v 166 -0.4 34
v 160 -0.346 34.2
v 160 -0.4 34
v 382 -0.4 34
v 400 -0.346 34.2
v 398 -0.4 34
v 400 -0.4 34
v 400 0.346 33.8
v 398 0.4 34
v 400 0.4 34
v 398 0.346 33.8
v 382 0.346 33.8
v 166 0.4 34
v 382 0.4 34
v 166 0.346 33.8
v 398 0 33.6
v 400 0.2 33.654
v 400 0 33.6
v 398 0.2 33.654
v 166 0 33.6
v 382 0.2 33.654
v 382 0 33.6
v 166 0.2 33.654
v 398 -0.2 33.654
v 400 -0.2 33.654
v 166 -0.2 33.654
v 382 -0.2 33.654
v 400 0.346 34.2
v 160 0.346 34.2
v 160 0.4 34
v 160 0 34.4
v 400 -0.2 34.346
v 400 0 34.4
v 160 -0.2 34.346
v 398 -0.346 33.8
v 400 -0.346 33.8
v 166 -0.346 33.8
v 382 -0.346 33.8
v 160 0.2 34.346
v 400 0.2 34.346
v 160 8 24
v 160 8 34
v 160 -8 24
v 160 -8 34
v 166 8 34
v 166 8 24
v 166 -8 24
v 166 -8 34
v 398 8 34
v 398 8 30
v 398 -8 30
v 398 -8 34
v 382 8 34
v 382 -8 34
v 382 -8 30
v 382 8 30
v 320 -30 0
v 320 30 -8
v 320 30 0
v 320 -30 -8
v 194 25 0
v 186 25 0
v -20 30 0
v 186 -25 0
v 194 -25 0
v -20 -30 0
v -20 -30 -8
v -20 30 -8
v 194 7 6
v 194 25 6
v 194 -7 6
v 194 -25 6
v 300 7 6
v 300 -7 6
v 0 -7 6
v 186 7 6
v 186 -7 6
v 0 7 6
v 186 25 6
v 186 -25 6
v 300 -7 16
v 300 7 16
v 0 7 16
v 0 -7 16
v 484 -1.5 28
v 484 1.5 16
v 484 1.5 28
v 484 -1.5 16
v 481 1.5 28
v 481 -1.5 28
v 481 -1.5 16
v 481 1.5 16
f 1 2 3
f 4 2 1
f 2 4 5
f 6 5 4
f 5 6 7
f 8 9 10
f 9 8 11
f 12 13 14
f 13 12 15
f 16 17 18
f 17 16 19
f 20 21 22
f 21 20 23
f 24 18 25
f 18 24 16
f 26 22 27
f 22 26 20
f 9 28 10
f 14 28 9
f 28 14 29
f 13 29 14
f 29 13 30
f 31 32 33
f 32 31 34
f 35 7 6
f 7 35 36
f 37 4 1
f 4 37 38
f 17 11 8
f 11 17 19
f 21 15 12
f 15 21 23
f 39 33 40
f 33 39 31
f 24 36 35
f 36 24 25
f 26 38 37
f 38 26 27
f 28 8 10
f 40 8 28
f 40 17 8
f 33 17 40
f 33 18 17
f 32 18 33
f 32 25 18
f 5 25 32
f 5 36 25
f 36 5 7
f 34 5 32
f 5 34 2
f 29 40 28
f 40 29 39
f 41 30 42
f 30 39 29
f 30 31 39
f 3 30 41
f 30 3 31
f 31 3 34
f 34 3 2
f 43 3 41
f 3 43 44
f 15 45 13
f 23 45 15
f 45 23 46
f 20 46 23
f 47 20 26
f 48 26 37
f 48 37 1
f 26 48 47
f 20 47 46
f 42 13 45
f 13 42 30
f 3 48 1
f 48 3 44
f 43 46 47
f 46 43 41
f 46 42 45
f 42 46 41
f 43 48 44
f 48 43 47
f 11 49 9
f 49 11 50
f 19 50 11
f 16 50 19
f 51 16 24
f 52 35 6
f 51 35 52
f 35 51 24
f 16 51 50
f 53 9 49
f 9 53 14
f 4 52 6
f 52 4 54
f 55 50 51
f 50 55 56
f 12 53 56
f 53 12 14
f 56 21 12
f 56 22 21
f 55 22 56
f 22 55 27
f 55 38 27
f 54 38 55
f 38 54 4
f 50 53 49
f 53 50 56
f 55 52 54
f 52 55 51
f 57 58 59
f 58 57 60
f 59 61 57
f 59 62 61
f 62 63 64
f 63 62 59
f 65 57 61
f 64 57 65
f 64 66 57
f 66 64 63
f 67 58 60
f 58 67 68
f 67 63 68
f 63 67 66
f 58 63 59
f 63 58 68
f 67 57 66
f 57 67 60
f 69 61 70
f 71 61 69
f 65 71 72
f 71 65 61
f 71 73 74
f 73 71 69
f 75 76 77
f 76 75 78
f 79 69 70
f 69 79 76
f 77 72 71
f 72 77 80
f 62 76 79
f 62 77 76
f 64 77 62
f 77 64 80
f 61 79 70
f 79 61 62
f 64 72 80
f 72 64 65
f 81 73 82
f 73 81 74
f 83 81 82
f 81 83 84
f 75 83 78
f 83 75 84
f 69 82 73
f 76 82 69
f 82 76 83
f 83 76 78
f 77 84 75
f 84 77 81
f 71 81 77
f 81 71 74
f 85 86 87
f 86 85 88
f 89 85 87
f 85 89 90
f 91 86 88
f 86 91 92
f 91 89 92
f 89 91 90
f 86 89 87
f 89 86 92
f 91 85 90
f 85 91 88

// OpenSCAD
// Clavichord tangent-key action coupon — ILLUSTRATIVE SCAFFOLD ONLY.
//
// Authority: pending_measurement. NOT fabrication authority. This packet is a
// V5 L2 concept study that INTENTIONALLY RELEASES NO DIMENSIONS: no scale
// length, string count, gauges, tuning, tangent coordinates, key dimensions,
// key dip, leverage, bridge/hitch layout, or case geometry (design.md,
// README "Readiness Boundary"). Every parameter below is an
// `estimate_pending_measurement` PLACEHOLDER chosen only so the mechanism reads
// as a shape — none is a design value, and none may be measured off this model
// or used to cut, drill, or lay out tangent positions.
//
// What this models: the design.md "first design job" — a single-key action
// coupon that shows how a key lever lifts a brass tangent into a string from
// below, the tangent both exciting the string and defining its speaking length
// while the key is held (the bebung / dynamic-touch mechanism). It is a
// topology diagram, not a part.
//
// Source: design.md "Mechanism Overview" / "L2 Subsystem Plan" (qualitative).
// Units: millimetres (illustrative scale only).

/* [ILLUSTRATIVE PLACEHOLDERS — NOT design values] */
// Each maps to a design.md estimate_*_pending_measurement parameter name.
est_key_length_mm        = 300;  // estimate_key_leverage_* (lever length)
est_key_width_mm         = 14;   // key blade width (illustrative)
est_key_thick_mm         = 10;
est_balance_from_front   = 190;  // estimate_key_leverage_* (pivot station)
est_key_dip_mm           = 6;    // estimate_key_dip_* (shown at rest = 0)
est_tangent_height_mm    = 12;   // estimate_tangent_face_* (brass blade)
est_tangent_width_mm     = 3;
est_string_course_mm     = 240;  // estimate_string_course_plan_* (bridge->hitch)
est_string_z_mm          = 34;   // string plane above baseboard (illustrative)
est_bridge_h_mm          = 10;   // estimate_bridge_hitchpin_field_*
est_show_pressed         = 0;    // 0 = key at rest, 1 = tangent in contact

// ---------------------------------------------------------------------------
// Illustrative geometry (topology, not dimensioned parts)
// ---------------------------------------------------------------------------

// Rotation of the key about the balance rail when a key is pressed. Derived
// from the illustrative dip only — NOT an action-geometry claim.
key_angle = est_show_pressed
  ? atan2(est_key_dip_mm, est_balance_from_front) : 0;

module baseboard() {
  color("tan")
    translate([-20, -30, -8]) cube([est_key_length_mm + 40, 60, 8]);
}

module balance_rail() {
  color("saddlebrown")
    translate([est_balance_from_front - 4, -25, 0]) cube([8, 50, 6]);
}

// Single key lever, pivoting about the balance rail. Front (player) end at x=0,
// tangent end at the rear.
module key_lever() {
  color("cornsilk")
    translate([est_balance_from_front, 0, 6])
      rotate([0, key_angle, 0])
        translate([-est_balance_from_front, -est_key_width_mm / 2, 0])
          cube([est_key_length_mm, est_key_width_mm, est_key_thick_mm]);
}

// Brass tangent standing at the rear of the key; it rises into the string when
// the key is pressed. Position follows the key rotation.
module tangent() {
  color("goldenrod")
    translate([est_balance_from_front, 0, 6])
      rotate([0, key_angle, 0])
        translate([est_key_length_mm - est_tangent_width_mm - 6,
                   -est_tangent_width_mm / 2, est_key_thick_mm])
          cube([est_tangent_width_mm, est_tangent_width_mm,
                est_tangent_height_mm]);
}

// A single string course from bridge to hitch, held at the string plane. The
// tangent contacts it partway along, splitting sounding (bridge side) from
// damped (hitch side) — the clavichord's defining feature.
module string_course() {
  x_tangent = est_key_length_mm + est_balance_from_front
              - est_balance_from_front - est_tangent_width_mm - 6
              + est_balance_from_front;  // tangent x-station (illustrative)
  color("silver")
    translate([est_balance_from_front - 30, 0, est_string_z_mm])
      rotate([0, 90, 0])
        cylinder(h = est_string_course_mm, d = 0.8, $fn = 12);
  // Bridge (bridge-side speaking boundary) and hitch (damped end).
  color("peru")
    translate([est_balance_from_front - 30, -8, est_string_z_mm - est_bridge_h_mm])
      cube([6, 16, est_bridge_h_mm]);
  color("dimgray")   // damping felt at the hitch (non-speaking) end
    translate([est_balance_from_front - 30 + est_string_course_mm - 18, -8,
               est_string_z_mm - 4])
      cube([16, 16, 4]);
}

module clavichord_coupon() {
  baseboard();
  balance_rail();
  key_lever();
  tangent();
  string_course();
}

clavichord_coupon();

echo("CLAVICHORD ACTION COUPON — ILLUSTRATIVE ONLY, no released dimensions.");
echo(str("est_show_pressed=", est_show_pressed, " (all values are ",
         "estimate_pending_measurement placeholders, not authority)"));
